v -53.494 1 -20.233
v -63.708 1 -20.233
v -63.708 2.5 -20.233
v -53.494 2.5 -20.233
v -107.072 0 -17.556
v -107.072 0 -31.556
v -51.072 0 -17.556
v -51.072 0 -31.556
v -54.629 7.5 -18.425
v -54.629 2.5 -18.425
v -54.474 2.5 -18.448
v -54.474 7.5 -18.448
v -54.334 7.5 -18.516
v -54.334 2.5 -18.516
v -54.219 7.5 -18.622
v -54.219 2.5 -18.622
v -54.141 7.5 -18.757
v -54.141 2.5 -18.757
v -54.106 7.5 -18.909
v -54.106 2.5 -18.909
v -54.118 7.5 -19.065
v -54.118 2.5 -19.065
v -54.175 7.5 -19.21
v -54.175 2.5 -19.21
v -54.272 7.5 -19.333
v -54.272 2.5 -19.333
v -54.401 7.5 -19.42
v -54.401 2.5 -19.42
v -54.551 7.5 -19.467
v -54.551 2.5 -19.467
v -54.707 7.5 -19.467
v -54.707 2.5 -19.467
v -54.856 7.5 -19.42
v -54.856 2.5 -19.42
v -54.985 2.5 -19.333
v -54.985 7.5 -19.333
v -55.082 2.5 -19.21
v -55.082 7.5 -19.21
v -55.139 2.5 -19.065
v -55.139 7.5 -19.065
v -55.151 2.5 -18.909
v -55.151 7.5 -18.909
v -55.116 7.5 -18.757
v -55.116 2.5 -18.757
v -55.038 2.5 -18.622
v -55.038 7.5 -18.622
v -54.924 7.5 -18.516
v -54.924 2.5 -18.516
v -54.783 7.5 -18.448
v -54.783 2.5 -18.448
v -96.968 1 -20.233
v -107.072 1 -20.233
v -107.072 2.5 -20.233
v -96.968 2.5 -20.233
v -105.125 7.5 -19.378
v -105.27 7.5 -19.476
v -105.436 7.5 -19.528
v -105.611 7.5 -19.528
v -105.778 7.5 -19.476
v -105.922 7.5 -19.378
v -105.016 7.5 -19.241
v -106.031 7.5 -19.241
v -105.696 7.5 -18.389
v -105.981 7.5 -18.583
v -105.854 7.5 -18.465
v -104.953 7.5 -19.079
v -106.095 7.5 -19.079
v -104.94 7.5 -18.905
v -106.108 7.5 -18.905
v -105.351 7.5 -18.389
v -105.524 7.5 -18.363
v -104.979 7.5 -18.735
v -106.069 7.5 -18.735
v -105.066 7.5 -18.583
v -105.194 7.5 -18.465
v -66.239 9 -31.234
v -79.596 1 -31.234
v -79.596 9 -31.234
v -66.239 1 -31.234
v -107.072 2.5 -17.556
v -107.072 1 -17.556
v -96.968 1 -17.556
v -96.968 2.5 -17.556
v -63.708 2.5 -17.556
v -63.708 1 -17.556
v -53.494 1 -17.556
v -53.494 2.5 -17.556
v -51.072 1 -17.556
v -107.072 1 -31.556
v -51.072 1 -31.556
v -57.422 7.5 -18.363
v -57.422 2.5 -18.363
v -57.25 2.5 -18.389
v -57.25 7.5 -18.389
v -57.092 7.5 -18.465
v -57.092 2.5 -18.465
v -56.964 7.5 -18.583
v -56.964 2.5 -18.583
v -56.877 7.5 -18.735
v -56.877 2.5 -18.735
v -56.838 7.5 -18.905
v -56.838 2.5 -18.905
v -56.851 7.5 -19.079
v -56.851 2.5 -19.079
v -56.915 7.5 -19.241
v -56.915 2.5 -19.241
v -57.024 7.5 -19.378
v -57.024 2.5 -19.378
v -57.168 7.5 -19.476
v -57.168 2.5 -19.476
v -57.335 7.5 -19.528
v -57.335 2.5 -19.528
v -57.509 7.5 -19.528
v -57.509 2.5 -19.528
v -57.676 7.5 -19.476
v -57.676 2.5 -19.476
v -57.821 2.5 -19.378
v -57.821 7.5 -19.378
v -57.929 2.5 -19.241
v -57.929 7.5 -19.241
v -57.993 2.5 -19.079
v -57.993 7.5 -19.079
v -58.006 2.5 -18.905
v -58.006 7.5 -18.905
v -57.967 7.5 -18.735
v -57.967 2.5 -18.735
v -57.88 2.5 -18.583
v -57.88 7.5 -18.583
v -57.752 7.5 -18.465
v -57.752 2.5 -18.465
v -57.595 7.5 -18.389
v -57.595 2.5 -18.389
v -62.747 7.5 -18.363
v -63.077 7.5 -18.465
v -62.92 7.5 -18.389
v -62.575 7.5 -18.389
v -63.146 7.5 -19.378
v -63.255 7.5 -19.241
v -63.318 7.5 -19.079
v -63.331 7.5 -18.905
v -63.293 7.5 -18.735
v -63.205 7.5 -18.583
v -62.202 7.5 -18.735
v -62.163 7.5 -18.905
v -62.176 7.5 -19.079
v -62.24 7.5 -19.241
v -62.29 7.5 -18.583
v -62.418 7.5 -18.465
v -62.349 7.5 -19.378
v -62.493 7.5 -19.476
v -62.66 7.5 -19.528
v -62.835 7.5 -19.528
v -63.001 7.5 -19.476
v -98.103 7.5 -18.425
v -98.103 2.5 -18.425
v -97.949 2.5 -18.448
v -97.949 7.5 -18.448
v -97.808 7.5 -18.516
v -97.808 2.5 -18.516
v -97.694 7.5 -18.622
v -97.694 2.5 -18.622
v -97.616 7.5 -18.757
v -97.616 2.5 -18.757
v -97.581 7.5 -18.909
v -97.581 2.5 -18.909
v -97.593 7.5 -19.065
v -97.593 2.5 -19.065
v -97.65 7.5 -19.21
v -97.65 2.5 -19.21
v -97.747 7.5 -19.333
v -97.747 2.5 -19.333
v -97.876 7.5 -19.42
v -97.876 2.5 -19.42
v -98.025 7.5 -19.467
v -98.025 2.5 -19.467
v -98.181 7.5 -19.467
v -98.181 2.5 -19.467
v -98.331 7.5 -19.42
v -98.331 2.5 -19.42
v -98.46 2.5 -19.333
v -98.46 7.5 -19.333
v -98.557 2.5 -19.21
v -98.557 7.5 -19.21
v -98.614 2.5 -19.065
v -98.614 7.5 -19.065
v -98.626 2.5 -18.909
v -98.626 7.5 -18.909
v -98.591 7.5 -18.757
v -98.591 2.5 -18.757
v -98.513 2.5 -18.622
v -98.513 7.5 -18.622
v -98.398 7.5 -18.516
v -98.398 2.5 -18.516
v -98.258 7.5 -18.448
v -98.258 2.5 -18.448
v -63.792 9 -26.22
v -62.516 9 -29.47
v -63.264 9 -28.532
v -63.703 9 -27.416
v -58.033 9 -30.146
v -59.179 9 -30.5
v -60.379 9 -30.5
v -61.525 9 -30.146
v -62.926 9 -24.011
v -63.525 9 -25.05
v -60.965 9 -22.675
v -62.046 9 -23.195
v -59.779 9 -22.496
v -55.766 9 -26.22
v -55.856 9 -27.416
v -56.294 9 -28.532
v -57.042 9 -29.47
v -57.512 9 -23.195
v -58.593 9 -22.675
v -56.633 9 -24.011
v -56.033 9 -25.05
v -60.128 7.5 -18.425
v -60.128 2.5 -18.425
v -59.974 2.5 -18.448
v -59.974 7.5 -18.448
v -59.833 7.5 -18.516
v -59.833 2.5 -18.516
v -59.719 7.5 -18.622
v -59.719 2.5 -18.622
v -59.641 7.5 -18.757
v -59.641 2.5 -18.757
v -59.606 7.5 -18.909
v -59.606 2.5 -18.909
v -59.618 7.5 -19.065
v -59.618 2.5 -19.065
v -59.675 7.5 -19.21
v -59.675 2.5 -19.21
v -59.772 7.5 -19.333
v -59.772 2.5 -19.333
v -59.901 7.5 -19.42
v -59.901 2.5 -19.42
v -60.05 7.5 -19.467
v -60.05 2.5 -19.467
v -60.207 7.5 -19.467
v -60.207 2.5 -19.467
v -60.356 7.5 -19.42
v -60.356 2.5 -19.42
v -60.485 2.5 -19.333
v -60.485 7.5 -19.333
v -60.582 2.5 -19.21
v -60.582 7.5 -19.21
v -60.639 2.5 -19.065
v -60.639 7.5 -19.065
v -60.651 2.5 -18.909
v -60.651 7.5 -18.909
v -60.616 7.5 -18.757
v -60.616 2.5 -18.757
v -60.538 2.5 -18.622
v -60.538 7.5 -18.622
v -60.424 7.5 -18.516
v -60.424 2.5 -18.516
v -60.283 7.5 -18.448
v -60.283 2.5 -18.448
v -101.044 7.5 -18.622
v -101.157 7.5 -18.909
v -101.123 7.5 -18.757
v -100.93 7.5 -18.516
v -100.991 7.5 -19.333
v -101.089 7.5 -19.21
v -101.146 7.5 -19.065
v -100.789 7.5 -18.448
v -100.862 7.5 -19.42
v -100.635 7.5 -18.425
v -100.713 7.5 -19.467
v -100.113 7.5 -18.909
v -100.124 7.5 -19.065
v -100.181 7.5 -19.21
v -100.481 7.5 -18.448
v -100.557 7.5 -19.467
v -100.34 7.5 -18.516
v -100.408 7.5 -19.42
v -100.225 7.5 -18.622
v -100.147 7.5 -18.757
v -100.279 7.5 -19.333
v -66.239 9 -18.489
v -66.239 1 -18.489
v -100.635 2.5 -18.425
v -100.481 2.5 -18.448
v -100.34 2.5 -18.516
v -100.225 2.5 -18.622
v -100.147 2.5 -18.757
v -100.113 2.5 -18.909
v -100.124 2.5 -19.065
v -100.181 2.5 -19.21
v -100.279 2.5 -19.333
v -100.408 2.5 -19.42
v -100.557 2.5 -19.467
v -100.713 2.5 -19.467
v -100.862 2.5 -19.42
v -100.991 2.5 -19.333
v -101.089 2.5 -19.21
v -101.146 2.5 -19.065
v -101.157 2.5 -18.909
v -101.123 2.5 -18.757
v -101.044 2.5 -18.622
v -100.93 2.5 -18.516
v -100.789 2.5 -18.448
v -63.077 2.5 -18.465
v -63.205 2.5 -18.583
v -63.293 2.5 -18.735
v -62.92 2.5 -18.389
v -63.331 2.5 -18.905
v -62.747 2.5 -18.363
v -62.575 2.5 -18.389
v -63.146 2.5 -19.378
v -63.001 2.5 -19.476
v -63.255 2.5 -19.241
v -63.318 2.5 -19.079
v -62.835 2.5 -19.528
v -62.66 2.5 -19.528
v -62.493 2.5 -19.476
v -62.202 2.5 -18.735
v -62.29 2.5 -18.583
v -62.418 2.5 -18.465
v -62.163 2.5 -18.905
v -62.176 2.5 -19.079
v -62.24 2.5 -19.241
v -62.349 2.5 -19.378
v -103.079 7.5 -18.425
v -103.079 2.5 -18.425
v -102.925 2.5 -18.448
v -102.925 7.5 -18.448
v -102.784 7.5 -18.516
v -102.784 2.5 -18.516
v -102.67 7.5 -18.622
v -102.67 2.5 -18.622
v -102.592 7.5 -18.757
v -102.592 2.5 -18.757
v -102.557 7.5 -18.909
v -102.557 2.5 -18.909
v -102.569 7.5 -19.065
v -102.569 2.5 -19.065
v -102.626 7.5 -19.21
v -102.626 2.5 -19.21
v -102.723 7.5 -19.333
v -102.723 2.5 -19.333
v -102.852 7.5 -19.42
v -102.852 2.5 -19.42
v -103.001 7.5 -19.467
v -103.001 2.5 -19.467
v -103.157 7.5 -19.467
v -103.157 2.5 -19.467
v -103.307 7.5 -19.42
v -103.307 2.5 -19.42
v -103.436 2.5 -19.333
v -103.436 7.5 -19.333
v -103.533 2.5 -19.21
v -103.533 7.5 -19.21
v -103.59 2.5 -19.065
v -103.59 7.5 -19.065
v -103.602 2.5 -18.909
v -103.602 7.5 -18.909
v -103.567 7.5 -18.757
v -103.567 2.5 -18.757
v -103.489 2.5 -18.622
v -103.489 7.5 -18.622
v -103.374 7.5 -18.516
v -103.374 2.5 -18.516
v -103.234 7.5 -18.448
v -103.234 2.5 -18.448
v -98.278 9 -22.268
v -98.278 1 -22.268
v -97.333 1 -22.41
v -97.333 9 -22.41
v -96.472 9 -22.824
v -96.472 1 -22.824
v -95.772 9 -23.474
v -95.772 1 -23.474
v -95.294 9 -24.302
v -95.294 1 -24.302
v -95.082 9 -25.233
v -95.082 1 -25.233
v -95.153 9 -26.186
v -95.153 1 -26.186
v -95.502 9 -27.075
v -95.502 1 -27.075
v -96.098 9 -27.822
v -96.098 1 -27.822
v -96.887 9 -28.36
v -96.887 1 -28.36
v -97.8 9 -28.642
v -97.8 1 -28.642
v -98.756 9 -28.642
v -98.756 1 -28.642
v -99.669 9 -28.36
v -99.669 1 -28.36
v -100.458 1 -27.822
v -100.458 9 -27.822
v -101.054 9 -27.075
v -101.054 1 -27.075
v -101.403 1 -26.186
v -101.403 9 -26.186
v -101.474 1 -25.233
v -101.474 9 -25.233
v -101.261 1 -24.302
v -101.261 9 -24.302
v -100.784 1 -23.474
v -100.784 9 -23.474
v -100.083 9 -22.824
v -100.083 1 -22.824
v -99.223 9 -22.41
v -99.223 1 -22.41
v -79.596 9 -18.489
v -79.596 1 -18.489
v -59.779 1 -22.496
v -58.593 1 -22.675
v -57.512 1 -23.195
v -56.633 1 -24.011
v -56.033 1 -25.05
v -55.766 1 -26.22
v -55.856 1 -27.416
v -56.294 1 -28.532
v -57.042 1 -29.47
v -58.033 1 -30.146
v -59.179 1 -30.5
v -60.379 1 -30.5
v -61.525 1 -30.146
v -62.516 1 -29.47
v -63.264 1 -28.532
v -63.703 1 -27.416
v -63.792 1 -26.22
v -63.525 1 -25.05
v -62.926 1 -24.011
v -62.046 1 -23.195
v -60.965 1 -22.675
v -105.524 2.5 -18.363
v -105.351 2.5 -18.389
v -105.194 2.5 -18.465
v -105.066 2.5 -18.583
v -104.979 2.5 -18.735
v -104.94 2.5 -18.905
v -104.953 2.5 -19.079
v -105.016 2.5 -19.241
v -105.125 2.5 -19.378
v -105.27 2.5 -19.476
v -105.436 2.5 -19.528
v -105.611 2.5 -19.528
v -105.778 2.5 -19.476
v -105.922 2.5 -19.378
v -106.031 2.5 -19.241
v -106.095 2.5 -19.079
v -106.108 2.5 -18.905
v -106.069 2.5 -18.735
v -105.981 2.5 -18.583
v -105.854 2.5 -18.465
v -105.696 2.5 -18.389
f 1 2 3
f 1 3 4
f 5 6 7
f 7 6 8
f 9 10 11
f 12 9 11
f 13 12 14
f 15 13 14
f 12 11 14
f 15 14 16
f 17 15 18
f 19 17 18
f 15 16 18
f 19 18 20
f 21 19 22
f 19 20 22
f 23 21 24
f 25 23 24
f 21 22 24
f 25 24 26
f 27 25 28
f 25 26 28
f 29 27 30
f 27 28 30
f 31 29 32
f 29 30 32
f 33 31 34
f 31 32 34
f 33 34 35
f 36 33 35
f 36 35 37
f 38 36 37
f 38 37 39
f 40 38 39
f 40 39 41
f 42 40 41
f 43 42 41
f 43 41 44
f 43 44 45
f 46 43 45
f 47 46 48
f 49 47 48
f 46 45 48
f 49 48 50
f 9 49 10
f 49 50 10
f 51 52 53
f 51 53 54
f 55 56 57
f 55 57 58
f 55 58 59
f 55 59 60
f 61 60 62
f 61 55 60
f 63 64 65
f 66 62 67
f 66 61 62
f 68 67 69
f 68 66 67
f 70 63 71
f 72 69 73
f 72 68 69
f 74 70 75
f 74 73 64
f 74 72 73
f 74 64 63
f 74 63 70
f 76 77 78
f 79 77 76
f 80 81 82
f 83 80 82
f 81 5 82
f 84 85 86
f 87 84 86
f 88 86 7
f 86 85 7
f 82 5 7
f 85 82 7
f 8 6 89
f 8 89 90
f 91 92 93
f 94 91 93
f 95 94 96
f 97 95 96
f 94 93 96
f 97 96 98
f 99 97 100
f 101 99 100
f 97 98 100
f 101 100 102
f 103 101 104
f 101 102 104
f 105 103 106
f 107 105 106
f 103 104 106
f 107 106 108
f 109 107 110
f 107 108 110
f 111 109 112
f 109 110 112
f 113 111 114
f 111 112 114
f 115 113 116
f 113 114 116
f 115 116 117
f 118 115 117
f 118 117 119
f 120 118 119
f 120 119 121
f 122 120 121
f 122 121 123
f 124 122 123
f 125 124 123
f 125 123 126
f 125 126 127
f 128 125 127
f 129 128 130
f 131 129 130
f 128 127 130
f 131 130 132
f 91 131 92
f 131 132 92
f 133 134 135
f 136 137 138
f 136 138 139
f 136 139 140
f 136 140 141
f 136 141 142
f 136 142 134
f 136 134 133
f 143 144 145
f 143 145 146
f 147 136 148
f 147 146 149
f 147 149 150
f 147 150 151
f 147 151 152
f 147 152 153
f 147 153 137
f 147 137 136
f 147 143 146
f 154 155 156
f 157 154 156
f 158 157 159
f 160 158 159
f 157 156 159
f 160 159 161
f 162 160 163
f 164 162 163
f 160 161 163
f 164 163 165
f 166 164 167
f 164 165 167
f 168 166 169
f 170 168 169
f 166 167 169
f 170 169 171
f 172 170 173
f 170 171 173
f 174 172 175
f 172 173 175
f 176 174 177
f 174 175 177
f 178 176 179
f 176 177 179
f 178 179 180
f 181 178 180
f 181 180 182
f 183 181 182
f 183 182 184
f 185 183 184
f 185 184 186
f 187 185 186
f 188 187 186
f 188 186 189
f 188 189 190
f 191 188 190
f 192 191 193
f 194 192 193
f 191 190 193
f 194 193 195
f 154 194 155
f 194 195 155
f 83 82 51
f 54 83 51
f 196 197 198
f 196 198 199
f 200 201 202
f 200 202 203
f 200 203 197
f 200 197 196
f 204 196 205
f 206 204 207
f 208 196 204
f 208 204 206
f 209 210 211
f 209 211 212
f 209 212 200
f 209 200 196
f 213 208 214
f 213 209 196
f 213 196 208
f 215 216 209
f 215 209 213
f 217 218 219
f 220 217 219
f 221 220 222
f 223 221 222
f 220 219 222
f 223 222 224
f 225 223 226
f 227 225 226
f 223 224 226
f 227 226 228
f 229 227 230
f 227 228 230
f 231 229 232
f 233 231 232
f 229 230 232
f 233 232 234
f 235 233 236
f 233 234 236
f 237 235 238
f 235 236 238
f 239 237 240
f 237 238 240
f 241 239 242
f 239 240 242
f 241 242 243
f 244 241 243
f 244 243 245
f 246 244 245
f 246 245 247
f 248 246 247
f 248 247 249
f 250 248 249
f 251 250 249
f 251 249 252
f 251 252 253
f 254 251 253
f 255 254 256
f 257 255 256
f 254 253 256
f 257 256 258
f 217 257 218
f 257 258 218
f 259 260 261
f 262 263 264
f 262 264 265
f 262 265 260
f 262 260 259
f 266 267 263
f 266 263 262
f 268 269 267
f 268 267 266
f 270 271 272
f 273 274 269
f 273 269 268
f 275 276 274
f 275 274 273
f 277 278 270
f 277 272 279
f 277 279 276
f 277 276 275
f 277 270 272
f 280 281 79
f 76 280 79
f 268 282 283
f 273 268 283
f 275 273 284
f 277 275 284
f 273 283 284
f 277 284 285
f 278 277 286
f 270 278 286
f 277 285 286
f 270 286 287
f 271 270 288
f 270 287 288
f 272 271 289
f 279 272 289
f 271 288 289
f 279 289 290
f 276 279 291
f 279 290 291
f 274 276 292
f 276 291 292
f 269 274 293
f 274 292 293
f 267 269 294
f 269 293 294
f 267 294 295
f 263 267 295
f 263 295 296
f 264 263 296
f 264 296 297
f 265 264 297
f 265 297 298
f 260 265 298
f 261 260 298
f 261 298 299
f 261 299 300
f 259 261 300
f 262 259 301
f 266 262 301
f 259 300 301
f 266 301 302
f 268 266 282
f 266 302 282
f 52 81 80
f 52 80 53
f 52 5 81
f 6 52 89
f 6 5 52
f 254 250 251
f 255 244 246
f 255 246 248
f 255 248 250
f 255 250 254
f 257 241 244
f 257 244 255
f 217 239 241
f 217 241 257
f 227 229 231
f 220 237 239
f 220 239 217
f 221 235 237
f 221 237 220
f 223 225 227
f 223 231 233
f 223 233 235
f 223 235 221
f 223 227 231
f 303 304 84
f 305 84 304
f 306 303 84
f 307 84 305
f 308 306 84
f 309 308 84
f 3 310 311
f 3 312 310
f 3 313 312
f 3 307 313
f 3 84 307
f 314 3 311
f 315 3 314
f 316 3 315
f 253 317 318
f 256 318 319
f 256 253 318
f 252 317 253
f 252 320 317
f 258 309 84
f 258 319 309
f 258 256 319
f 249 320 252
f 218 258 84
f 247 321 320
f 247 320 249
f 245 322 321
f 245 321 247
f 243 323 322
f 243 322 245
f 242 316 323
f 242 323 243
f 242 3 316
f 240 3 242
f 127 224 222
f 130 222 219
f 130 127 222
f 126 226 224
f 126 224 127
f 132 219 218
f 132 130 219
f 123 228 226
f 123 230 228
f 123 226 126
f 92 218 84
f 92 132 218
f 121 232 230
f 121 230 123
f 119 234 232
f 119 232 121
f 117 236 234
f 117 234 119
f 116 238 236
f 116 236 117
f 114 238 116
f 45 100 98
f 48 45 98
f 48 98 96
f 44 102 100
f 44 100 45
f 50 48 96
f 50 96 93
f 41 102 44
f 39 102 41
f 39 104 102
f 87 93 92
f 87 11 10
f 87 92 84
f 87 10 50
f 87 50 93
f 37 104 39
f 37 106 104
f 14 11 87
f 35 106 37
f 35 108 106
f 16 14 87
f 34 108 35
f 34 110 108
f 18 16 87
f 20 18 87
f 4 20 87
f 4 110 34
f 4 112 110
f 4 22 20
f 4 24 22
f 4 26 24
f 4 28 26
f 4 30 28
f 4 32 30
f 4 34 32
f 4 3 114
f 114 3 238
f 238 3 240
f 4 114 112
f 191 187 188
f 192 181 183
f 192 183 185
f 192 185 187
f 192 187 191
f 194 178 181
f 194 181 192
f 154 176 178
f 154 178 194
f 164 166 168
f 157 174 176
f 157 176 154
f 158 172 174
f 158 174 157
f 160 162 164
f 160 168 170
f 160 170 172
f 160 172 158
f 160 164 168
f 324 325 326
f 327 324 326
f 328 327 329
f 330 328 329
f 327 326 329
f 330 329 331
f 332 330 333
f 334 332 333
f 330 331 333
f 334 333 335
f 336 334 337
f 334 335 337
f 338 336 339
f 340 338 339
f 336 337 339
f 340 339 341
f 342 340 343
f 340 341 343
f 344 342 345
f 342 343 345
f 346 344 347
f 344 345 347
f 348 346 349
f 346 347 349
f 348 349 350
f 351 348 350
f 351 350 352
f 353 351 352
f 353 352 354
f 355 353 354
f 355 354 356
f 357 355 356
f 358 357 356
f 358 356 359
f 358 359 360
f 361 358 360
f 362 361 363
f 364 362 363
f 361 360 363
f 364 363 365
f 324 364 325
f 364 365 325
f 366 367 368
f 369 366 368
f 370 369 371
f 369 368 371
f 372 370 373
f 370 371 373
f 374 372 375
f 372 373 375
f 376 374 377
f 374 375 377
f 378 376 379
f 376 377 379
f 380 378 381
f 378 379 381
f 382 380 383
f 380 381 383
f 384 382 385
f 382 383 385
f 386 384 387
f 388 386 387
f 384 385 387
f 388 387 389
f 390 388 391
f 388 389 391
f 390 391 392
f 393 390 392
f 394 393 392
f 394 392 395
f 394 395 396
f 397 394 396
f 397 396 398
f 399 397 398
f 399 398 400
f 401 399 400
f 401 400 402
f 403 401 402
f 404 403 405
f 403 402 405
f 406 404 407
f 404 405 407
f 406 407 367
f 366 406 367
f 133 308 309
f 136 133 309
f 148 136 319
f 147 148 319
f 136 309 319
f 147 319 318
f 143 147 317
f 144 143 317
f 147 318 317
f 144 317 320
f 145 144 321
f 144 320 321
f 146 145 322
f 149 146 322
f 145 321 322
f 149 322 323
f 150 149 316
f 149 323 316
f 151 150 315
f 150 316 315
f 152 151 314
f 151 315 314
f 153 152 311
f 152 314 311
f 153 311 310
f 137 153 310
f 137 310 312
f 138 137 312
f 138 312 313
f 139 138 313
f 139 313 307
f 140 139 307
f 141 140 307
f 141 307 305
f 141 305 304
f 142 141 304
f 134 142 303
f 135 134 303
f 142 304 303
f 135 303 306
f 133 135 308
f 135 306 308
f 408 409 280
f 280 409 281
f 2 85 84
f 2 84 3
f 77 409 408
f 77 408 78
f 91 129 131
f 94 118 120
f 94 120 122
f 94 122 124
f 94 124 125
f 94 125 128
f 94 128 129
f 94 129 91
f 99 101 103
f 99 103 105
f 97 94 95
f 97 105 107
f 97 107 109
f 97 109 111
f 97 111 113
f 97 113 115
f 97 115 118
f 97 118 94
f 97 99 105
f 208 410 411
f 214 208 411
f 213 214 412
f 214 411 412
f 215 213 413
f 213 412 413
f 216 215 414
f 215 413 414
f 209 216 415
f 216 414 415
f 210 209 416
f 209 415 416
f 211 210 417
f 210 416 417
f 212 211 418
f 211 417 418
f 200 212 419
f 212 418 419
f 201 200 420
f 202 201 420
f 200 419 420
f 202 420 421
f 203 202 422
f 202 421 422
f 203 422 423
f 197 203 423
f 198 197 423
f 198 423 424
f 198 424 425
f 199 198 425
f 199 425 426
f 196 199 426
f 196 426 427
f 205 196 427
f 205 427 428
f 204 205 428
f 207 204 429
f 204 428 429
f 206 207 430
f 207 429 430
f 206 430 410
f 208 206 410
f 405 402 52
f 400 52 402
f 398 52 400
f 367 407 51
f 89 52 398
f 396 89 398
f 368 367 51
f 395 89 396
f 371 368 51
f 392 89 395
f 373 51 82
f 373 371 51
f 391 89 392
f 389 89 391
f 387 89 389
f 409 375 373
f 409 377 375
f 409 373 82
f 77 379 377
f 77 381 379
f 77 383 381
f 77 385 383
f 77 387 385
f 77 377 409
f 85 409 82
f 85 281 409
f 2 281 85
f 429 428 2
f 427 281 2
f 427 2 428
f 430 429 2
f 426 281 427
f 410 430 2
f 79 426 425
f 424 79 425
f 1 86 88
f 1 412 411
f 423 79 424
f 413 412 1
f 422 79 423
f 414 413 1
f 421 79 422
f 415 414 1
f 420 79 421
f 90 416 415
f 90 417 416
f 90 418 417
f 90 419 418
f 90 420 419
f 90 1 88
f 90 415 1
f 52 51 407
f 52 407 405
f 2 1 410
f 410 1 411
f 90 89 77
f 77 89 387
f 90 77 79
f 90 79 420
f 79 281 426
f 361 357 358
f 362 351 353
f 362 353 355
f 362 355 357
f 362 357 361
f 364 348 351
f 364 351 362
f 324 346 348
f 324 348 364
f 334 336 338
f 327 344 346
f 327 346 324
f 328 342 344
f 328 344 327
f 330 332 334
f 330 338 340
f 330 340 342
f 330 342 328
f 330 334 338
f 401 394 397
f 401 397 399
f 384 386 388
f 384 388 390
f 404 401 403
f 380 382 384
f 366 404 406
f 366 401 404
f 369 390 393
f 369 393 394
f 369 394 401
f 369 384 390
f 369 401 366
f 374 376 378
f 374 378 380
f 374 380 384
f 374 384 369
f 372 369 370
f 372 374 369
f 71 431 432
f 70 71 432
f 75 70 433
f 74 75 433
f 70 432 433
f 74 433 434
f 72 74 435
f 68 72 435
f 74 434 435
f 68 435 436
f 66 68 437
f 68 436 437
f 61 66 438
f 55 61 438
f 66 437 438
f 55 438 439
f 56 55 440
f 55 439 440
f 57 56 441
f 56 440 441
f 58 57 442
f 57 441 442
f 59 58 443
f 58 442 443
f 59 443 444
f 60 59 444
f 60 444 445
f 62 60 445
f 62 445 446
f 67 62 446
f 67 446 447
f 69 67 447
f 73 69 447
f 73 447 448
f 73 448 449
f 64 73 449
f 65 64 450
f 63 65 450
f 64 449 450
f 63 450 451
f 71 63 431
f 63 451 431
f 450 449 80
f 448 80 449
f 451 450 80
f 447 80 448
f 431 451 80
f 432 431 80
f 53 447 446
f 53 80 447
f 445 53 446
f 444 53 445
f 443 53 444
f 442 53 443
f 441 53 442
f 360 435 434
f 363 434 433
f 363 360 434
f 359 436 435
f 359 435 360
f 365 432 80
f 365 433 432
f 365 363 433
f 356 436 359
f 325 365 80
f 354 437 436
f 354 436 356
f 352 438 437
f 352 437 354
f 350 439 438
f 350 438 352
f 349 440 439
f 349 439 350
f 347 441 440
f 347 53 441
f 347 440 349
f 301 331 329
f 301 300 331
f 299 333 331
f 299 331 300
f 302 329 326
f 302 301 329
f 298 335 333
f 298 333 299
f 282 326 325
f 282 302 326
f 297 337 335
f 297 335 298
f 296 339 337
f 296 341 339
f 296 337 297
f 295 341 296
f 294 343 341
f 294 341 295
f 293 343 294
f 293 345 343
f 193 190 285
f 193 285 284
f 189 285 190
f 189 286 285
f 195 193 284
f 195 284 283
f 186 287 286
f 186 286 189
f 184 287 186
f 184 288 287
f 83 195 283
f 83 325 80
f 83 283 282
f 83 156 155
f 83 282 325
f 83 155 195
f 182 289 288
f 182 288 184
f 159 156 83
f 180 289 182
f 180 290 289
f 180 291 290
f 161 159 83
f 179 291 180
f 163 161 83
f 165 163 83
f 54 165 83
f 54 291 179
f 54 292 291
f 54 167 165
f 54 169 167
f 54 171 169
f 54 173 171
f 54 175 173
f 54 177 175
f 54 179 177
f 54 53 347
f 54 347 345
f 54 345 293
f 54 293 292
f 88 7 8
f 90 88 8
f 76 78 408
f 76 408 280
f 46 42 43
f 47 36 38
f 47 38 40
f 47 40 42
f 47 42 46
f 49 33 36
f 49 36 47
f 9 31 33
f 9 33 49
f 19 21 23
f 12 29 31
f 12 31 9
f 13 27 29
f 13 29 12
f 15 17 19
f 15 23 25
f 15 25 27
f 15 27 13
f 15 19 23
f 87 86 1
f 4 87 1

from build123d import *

# Parameters (mm, degrees)
SKETCH1_W           = 56
SKETCH1_H           = 14
BOSS_EXTRUDE1_DEPTH = 1
SKETCH2_R           = 3.20517332
SKETCH2_R_2         = 4.024260076
SKETCH2_W           = 13.356664084
SKETCH2_H           = 12.745574878
BOSS_EXTRUDE2_DEPTH = 8
SKETCH3_W           = 10.103816096
SKETCH3_H           = 2.676767311
SKETCH3_W_2         = 10.213919594
BOSS_EXTRUDE4_DEPTH = 1.5
SKETCH4_R           = 0.58561586
SKETCH4_R_2         = 0.523790748
BOSS_EXTRUDE5_DEPTH = 5


with BuildPart() as part:
    # Sketch1 → Boss-Extrude1 (new body)
    with BuildSketch(Plane(origin=(0, 0, 0), x_dir=(1, 0, 0), z_dir=(0, 1, 0))):
        with Locations((-79.072208288, 24.556101007)):
            Rectangle(SKETCH1_W, SKETCH1_H)
    extrude(amount=BOSS_EXTRUDE1_DEPTH)

    # Sketch2 → Boss-Extrude2 (add)
    with BuildSketch(Plane(origin=(0, 1, 0), x_dir=(1, 0, 0), z_dir=(0, 1, 0))):
        with Locations((-98.277869063, 25.472734817)):
            Circle(SKETCH2_R)
        with Locations((-59.779249055, 26.520316314)):
            Circle(SKETCH2_R_2)
        with Locations((-72.917666994, 24.86164561)):
            Rectangle(SKETCH2_W, SKETCH2_H)
    extrude(amount=BOSS_EXTRUDE2_DEPTH)

    # Sketch3 → Boss-Extrude4 (add)
    with BuildSketch(Plane(origin=(0, 1, 0), x_dir=(1, 0, 0), z_dir=(0, 1, 0))):
        with Locations((-102.02030024, 18.894484663)):
            Rectangle(SKETCH3_W, SKETCH3_H)
        with Locations((-58.600719871, 18.894484663)):
            Rectangle(SKETCH3_W_2, SKETCH3_H)
    extrude(amount=BOSS_EXTRUDE4_DEPTH)

    # Sketch4 → Boss-Extrude5 (add)
    with BuildSketch(Plane(origin=(0, 2.5, 0), x_dir=(1, 0, 0), z_dir=(0, 1, 0))):
        with Locations((-105.523641083, 18.948565176)):
            Circle(SKETCH4_R)
        with Locations((-103.079284257, 18.948565176)):
            Circle(SKETCH4_R_2)
        with Locations((-100.634927431, 18.948565176)):
            Circle(SKETCH4_R_2)
        with Locations((-98.103272147, 18.948565176)):
            Circle(SKETCH4_R_2)
        with Locations((-62.747396629, 18.948565176)):
            Circle(SKETCH4_R)
        with Locations((-60.128442887, 18.948565176)):
            Circle(SKETCH4_R_2)
        with Locations((-57.422190687, 18.948565176)):
            Circle(SKETCH4_R)
        with Locations((-54.628640029, 18.948565176)):
            Circle(SKETCH4_R_2)
    extrude(amount=BOSS_EXTRUDE5_DEPTH)


solid = part.part
